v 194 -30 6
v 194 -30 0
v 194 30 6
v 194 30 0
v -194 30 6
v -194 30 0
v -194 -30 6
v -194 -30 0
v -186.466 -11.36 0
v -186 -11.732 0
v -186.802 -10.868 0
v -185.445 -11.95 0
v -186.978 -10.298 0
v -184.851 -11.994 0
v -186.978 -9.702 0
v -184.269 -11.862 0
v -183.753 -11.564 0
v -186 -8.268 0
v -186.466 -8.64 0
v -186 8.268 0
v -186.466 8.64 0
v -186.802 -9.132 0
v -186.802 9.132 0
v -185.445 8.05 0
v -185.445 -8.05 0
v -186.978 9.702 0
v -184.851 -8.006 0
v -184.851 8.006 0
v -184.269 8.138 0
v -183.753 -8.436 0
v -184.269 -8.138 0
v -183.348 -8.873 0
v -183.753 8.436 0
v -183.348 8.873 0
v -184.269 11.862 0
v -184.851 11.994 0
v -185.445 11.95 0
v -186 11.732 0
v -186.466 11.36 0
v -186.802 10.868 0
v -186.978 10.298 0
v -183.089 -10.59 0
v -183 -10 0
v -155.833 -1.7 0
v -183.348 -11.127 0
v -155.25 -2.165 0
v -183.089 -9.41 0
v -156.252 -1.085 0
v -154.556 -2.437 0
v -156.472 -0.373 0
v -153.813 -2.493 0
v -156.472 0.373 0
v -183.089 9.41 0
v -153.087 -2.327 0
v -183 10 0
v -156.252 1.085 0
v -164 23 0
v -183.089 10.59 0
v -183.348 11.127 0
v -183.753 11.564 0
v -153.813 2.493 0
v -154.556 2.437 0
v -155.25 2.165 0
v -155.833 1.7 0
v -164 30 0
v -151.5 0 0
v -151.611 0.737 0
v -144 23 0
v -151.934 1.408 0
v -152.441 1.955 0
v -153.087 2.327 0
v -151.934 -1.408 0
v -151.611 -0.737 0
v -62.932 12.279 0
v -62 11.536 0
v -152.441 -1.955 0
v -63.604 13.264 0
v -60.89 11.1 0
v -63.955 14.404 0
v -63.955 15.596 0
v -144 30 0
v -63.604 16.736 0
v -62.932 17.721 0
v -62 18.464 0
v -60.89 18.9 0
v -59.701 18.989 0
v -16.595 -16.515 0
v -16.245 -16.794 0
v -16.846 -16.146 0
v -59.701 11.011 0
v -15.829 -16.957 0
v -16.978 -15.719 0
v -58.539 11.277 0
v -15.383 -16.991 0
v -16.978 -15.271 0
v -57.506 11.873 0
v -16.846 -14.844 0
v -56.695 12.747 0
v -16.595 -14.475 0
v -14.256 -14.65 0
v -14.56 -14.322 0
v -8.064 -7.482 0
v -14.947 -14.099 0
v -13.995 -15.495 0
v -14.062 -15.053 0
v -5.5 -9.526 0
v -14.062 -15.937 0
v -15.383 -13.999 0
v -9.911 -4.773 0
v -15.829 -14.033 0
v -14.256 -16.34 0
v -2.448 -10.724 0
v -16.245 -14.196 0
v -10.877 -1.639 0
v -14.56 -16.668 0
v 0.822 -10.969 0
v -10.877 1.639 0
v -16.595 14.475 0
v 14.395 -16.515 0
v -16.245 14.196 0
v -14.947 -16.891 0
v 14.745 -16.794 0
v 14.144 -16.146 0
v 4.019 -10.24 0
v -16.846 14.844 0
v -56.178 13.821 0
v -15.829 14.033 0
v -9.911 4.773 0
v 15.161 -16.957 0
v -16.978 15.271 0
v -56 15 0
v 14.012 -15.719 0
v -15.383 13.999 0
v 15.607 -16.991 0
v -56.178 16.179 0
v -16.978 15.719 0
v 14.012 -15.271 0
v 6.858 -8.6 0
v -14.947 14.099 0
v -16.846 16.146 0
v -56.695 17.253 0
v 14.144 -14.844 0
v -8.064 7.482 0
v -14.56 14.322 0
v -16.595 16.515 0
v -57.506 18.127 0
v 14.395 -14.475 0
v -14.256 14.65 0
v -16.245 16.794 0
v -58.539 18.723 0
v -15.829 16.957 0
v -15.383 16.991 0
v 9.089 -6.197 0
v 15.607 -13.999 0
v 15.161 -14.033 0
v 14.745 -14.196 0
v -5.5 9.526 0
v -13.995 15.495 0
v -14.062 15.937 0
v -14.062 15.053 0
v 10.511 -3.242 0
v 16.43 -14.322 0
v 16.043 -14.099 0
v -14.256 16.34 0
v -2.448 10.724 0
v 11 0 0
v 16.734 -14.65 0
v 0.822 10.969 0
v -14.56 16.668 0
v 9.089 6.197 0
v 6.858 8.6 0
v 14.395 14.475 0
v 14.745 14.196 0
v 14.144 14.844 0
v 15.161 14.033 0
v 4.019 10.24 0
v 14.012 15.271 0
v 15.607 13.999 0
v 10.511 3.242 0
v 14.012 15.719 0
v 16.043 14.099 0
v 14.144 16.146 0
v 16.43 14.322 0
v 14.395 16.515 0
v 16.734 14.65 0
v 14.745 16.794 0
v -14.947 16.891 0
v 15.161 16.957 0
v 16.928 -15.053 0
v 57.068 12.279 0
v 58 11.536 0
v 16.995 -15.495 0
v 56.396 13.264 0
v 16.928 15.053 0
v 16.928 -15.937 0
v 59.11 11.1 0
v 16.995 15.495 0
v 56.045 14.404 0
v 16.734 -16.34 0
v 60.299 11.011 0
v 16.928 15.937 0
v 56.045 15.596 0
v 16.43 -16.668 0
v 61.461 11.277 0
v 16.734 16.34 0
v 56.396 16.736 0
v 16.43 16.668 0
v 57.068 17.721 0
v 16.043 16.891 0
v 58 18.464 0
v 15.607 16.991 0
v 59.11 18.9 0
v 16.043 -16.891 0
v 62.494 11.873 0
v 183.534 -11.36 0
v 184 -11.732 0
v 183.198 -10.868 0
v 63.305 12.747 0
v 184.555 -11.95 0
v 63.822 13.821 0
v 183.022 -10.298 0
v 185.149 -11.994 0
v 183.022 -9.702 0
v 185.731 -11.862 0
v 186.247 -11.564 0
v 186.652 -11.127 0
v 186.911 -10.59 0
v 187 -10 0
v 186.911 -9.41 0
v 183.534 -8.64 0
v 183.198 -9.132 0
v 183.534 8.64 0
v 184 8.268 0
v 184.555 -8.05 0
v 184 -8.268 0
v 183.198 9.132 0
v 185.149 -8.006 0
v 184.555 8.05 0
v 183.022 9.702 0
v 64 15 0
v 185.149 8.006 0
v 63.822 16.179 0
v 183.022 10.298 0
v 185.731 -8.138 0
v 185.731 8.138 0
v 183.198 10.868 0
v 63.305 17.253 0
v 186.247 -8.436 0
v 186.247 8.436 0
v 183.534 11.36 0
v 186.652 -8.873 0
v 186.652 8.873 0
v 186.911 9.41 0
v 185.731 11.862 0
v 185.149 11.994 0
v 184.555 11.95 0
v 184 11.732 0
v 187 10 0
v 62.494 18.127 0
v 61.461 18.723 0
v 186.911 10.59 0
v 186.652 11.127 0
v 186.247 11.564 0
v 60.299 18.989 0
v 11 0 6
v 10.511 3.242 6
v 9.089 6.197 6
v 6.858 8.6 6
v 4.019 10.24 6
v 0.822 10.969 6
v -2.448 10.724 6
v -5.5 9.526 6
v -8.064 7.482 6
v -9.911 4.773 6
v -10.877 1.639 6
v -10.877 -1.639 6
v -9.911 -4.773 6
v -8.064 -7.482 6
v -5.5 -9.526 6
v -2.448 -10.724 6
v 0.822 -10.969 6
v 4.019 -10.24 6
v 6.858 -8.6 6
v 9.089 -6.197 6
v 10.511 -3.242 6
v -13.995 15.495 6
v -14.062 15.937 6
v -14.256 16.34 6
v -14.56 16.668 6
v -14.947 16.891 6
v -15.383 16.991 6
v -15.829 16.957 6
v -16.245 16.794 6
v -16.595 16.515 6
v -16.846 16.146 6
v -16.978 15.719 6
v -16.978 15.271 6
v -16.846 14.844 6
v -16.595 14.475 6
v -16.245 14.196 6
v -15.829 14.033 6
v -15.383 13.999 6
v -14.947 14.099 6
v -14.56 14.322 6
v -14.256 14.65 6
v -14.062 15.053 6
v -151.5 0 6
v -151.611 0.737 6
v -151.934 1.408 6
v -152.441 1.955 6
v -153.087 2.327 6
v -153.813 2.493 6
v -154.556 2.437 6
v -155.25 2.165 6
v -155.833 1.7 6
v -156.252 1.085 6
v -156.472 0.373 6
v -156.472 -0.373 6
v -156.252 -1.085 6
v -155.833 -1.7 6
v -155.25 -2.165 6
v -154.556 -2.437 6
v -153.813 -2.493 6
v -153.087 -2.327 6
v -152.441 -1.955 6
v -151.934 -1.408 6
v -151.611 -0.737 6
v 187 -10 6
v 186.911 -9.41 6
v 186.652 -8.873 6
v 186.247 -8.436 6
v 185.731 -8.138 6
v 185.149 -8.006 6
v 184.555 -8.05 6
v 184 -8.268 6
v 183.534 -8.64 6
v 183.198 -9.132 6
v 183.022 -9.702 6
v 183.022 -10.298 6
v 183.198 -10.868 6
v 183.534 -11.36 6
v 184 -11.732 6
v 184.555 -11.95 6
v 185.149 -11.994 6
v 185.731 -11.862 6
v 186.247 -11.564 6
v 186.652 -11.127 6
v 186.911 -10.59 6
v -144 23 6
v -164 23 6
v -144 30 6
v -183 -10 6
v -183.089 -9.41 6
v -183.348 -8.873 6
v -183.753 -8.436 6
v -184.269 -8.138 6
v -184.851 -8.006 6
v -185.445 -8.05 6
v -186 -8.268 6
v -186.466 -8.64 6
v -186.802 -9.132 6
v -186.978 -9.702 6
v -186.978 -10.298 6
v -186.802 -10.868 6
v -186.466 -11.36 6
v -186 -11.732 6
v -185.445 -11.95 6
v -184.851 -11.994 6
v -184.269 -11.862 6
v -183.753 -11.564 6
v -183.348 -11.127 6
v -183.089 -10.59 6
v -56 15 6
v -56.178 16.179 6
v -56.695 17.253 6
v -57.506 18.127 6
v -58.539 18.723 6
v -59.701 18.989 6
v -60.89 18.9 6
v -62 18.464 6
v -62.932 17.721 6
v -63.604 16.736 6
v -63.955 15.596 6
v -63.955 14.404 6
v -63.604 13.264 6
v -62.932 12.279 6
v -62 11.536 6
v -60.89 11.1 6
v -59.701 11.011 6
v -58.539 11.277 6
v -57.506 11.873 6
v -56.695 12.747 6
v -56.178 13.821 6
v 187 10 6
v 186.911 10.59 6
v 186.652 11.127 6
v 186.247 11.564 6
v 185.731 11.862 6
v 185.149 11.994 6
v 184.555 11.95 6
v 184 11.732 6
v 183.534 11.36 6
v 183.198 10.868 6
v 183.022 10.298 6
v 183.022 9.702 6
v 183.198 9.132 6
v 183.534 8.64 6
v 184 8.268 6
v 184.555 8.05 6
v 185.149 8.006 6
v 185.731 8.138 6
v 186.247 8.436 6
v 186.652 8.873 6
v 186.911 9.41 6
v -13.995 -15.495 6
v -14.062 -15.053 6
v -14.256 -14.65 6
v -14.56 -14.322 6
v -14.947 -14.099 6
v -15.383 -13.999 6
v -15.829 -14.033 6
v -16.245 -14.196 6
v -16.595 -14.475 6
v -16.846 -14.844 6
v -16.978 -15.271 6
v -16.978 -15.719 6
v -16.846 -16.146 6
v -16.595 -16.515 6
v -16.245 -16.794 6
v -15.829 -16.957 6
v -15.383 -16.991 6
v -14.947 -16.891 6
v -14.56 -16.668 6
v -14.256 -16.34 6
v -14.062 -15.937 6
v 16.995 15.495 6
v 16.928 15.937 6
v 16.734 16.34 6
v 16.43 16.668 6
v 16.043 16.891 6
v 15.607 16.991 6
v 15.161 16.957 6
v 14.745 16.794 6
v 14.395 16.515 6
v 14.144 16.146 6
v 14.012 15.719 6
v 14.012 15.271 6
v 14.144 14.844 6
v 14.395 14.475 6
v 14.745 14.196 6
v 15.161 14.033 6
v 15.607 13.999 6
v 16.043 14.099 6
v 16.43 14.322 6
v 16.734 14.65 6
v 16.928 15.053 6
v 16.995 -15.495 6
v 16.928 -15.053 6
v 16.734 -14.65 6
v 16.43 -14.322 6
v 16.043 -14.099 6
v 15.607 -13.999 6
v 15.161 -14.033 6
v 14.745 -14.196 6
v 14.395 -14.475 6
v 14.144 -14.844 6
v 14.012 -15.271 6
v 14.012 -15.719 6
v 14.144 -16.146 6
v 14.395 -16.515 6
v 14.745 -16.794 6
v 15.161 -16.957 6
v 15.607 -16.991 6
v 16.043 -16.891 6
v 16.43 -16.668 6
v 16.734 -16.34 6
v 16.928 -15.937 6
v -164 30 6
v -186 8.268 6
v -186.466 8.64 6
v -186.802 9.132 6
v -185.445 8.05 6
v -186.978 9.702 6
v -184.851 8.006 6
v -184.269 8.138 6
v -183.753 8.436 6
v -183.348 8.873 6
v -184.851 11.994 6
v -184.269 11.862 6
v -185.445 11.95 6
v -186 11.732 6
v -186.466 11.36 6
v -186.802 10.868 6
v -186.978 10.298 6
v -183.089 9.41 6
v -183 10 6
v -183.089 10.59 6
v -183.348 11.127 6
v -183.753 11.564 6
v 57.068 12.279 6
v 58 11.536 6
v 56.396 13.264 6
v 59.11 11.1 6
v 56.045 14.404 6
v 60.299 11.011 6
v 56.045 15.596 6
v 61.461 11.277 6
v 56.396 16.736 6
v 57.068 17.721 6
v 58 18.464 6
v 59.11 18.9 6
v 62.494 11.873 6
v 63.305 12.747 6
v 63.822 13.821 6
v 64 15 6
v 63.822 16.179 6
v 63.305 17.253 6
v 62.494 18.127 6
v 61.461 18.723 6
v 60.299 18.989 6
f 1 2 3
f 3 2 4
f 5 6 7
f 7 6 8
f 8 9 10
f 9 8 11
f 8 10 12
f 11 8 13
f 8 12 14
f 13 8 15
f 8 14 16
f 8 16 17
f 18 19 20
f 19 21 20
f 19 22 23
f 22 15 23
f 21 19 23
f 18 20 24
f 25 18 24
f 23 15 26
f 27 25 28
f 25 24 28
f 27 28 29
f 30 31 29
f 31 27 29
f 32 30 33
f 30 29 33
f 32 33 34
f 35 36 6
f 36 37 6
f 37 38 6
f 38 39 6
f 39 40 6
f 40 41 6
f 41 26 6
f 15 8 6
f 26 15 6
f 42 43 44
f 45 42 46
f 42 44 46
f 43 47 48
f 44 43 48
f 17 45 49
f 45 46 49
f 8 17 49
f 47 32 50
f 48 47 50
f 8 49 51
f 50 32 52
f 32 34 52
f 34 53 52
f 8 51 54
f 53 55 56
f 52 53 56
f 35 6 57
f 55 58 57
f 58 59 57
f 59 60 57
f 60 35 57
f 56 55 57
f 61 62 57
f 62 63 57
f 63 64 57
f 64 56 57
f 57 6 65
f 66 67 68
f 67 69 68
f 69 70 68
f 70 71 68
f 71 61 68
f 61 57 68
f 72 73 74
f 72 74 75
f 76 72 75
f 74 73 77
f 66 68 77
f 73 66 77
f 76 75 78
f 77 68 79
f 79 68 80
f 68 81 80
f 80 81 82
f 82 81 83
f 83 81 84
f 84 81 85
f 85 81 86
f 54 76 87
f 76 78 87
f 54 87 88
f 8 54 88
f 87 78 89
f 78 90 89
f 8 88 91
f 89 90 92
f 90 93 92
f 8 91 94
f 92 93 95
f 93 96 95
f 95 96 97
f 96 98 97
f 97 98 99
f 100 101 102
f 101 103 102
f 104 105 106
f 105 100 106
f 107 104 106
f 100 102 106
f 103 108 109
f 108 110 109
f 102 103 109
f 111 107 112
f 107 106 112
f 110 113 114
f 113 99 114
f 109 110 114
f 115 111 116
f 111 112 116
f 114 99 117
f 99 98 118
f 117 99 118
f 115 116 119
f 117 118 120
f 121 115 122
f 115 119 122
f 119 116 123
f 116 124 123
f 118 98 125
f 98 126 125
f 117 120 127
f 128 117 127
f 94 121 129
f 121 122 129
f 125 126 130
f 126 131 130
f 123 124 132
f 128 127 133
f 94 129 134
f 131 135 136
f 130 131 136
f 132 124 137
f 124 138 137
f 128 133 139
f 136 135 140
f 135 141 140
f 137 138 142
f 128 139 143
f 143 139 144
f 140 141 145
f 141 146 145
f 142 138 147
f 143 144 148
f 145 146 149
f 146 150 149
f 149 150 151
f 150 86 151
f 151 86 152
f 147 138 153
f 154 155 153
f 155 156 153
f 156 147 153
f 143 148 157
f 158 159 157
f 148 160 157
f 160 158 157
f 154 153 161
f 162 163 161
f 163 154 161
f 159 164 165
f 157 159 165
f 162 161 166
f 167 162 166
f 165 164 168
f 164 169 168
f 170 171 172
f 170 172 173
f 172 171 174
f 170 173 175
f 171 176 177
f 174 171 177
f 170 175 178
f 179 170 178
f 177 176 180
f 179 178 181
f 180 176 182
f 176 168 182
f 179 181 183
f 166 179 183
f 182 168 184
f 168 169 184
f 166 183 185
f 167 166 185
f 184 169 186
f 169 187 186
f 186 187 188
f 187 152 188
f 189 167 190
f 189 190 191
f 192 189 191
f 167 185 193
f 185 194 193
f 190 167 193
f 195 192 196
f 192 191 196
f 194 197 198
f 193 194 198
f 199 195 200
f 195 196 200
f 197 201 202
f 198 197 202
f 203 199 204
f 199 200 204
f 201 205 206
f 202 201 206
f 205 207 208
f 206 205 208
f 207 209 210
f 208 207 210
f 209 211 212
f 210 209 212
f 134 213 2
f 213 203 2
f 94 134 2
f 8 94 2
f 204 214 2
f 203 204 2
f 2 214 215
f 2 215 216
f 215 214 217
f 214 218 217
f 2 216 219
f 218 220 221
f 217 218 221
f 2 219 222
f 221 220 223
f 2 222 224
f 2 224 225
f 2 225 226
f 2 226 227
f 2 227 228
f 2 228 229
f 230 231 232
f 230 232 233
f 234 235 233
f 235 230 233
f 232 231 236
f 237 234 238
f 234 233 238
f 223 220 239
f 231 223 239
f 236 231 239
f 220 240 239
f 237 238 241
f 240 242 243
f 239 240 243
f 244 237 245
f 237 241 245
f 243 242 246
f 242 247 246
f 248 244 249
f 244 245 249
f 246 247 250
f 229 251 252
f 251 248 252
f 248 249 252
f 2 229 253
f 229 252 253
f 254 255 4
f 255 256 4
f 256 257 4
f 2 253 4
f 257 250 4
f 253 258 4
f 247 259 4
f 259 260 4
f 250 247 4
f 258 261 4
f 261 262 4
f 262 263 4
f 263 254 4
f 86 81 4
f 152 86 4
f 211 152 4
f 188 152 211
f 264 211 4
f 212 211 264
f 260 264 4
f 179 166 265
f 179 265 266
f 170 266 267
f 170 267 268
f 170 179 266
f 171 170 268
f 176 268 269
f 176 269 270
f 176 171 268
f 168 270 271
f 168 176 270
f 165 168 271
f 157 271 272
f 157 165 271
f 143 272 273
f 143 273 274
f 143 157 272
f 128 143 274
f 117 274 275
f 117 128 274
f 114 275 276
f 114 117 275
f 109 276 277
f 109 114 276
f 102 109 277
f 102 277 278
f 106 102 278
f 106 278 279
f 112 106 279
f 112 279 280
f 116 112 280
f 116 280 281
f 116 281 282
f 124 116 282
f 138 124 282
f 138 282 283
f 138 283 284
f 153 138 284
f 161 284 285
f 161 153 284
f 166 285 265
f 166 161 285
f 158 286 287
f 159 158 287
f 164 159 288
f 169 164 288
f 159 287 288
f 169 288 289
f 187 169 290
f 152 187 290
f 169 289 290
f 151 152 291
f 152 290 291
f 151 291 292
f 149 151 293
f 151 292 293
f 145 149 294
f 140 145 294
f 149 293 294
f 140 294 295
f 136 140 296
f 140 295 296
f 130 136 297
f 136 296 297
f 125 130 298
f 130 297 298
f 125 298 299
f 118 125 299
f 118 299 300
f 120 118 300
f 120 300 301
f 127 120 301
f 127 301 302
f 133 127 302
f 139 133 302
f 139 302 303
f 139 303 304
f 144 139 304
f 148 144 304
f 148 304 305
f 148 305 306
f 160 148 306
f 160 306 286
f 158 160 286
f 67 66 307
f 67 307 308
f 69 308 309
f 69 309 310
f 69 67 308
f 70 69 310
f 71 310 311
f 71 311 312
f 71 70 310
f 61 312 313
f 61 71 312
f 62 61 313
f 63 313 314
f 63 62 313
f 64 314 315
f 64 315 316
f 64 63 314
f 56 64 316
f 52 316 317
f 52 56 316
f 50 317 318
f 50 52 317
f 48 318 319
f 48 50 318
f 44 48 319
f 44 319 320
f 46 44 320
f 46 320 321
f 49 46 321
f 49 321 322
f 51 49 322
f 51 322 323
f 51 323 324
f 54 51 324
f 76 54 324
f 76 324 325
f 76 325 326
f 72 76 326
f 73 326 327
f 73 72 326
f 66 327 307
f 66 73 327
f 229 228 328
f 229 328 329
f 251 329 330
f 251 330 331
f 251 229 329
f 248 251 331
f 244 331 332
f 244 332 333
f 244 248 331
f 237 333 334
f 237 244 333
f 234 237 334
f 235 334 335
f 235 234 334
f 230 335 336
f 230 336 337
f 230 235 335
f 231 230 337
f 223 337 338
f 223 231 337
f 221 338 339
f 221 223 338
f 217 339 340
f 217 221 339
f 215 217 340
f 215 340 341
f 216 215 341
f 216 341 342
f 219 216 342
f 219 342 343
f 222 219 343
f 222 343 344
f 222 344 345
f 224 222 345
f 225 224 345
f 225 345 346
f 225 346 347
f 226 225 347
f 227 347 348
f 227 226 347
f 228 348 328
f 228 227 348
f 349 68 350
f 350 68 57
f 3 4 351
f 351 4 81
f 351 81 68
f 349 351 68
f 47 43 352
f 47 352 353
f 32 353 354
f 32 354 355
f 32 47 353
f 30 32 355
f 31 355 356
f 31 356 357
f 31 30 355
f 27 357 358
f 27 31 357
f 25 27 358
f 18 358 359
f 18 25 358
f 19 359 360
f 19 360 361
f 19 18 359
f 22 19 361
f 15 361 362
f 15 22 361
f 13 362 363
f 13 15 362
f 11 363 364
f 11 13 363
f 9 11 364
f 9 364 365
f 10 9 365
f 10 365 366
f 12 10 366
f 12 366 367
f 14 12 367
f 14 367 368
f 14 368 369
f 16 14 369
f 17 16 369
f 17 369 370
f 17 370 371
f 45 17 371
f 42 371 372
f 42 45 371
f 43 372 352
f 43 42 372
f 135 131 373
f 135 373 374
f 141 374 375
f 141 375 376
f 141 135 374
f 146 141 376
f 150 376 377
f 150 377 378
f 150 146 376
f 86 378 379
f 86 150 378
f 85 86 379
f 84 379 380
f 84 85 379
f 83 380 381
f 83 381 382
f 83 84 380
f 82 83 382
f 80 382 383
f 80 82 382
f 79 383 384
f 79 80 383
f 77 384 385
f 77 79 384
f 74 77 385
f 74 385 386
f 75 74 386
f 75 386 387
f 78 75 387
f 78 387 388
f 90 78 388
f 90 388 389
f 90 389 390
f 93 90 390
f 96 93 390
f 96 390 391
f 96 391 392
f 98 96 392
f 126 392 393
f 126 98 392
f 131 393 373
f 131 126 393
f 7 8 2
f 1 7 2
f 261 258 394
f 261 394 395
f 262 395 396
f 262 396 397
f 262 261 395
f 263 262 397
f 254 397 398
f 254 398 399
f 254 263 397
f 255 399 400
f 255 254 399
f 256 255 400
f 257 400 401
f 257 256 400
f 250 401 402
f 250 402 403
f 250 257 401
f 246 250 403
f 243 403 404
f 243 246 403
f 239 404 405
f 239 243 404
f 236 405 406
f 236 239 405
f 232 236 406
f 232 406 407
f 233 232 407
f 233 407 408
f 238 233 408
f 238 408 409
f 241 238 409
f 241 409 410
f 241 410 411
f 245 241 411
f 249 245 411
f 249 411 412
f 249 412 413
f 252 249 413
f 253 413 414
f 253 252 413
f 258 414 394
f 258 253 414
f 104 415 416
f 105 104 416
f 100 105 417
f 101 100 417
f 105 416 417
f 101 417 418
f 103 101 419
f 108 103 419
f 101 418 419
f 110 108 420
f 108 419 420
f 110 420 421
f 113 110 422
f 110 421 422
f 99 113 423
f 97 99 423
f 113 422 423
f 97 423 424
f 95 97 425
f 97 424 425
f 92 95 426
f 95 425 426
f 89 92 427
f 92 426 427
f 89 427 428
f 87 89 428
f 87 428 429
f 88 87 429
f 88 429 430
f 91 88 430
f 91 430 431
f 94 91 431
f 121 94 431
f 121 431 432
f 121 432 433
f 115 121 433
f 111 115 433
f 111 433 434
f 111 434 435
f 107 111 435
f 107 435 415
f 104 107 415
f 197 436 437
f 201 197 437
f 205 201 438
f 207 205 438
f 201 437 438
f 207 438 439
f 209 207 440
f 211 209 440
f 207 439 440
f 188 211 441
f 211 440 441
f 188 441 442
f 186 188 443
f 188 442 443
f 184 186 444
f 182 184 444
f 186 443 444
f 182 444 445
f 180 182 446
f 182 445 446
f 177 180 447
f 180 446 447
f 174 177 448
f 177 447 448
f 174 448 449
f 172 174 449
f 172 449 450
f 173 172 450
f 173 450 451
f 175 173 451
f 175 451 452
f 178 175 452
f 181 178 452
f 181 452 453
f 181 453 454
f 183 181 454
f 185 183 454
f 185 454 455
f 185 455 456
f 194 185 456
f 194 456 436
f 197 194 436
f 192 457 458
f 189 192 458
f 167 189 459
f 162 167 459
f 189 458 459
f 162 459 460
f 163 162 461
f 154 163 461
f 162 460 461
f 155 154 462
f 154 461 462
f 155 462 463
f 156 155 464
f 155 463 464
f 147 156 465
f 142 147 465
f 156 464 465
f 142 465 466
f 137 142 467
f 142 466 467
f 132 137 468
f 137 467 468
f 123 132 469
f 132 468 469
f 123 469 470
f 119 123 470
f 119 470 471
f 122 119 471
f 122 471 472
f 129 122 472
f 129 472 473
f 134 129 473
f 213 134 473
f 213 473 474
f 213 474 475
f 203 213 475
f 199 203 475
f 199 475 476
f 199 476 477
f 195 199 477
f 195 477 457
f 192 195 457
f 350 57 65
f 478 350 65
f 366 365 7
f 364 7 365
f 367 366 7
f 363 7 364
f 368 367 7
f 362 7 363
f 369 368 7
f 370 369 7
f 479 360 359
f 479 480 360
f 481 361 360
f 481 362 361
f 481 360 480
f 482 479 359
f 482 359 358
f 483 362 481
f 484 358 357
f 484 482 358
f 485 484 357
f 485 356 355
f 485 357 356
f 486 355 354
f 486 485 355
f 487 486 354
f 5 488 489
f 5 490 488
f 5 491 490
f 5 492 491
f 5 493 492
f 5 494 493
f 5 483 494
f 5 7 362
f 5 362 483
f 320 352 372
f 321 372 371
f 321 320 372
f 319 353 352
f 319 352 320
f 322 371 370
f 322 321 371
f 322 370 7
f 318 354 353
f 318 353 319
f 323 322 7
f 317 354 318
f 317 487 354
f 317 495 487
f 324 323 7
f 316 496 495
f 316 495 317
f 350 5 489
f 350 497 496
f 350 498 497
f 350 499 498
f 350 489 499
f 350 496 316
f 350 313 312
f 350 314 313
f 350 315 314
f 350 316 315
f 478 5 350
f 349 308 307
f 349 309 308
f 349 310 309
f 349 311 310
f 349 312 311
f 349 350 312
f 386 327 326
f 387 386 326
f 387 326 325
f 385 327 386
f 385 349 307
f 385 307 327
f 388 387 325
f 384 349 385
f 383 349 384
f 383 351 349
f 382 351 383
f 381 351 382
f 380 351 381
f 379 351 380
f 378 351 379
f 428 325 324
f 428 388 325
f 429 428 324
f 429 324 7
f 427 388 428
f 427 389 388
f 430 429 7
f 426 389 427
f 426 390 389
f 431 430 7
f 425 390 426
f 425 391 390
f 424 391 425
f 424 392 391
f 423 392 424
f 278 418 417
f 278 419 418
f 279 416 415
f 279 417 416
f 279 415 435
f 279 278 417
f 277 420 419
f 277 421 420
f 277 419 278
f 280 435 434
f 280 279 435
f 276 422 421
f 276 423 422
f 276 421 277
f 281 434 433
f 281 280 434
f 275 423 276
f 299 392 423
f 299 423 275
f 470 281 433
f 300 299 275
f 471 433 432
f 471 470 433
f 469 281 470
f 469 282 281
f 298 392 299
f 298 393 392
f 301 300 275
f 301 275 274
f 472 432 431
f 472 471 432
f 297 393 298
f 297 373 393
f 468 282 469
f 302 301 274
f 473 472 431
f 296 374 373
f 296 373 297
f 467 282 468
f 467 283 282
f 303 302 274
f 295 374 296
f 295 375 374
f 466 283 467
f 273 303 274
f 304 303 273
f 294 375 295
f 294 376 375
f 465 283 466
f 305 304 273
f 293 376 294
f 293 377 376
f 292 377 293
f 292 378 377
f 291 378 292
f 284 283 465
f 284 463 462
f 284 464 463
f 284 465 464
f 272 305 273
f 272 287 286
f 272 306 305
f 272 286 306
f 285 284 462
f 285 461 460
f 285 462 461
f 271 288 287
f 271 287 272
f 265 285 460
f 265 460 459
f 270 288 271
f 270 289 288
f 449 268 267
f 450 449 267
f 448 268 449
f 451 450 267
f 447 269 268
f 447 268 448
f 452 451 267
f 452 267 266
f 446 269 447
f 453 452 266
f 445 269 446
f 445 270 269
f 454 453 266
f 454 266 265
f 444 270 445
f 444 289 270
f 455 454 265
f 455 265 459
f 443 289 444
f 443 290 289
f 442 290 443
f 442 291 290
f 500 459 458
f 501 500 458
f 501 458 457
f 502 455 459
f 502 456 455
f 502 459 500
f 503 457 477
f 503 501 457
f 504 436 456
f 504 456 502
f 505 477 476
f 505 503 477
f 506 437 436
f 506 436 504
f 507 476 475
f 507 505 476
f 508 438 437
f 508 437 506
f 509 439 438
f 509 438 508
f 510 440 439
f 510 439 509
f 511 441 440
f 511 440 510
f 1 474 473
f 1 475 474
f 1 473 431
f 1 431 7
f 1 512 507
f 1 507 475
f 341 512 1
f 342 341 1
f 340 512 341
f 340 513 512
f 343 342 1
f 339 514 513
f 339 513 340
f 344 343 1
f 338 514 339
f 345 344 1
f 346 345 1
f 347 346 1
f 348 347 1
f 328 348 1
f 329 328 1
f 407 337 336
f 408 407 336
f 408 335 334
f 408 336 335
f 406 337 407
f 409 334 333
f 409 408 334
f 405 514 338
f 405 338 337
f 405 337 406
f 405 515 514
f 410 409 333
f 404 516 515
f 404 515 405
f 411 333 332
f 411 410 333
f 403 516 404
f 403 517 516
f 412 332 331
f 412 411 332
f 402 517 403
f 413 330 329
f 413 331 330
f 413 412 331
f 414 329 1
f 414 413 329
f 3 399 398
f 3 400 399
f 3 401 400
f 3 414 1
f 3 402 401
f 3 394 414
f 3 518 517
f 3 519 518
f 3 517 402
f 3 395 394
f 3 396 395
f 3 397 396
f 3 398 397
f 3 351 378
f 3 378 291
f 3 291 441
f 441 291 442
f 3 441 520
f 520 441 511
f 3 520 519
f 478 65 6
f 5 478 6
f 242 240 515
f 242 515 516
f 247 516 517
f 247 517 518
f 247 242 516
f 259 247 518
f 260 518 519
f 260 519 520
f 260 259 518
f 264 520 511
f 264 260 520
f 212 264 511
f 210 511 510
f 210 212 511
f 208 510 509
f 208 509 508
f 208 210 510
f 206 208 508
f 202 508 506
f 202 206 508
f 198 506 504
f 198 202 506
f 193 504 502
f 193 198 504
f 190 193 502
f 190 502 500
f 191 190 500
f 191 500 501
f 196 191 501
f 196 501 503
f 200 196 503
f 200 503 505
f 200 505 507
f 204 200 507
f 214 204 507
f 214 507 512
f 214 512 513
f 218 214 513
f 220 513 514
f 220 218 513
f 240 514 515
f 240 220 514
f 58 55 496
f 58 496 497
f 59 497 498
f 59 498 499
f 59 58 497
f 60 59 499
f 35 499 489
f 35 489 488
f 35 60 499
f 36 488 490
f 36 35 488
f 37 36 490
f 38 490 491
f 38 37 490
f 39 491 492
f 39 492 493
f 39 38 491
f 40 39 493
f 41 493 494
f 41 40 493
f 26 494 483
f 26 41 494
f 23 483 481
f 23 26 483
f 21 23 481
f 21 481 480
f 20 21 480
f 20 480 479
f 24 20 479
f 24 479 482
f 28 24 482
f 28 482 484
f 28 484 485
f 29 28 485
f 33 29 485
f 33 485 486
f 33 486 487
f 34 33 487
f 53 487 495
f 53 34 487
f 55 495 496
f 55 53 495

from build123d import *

# Parameters (mm, degrees)
SKETCH1_R           = 2
SKETCH1_R_2         = 2.5
SKETCH1_R_3         = 4
SKETCH1_R_4         = 11
BOSS_EXTRUDE1_DEPTH = 6
CUT_EXTRUDE1_REACH  = 8
SKETCH2_R           = 1.5


with BuildPart() as part:
    # Sketch1 → Boss-Extrude1 (new body)
    with BuildSketch(Plane.XY):
        Polygon((-194, 30), (-194, -30), (194, -30), (194, 30), (-144, 30), (-144, 23), (-164, 23), (-164, 30), align=None)
        with Locations((-185, -10)):
            Circle(SKETCH1_R, mode=Mode.SUBTRACT)
        with Locations((185, -10)):
            Circle(SKETCH1_R, mode=Mode.SUBTRACT)
        with Locations((-154, 0)):
            Circle(SKETCH1_R_2, mode=Mode.SUBTRACT)
        with Locations((-185, 10)):
            Circle(SKETCH1_R, mode=Mode.SUBTRACT)
        with Locations((-60, 15)):
            Circle(SKETCH1_R_3, mode=Mode.SUBTRACT)
        Circle(SKETCH1_R_4, mode=Mode.SUBTRACT)
        with Locations((60, 15)):
            Circle(SKETCH1_R_3, mode=Mode.SUBTRACT)
        with Locations((185, 10)):
            Circle(SKETCH1_R, mode=Mode.SUBTRACT)
    extrude(amount=BOSS_EXTRUDE1_DEPTH)

    # Sketch2 → Cut-Extrude1 (cut, up to next)
    with BuildSketch(Plane.XY.offset(6), mode=Mode.PRIVATE) as cut_extrude1_sk1:
        with Locations((15.495, 15.495)):
            Circle(SKETCH2_R)
    cut_extrude1_tool1 = extrude(cut_extrude1_sk1.sketch, amount=-CUT_EXTRUDE1_REACH, mode=Mode.PRIVATE) & part.part
    add(cut_extrude1_tool1.solids().sort_by_distance((15.495, 15.495, 6))[0], mode=Mode.SUBTRACT)
    # Sketch2 → Cut-Extrude1 (cut, up to next)
    with BuildSketch(Plane.XY.offset(6), mode=Mode.PRIVATE) as cut_extrude1_sk2:
        with Locations((-15.495, 15.495)):
            Circle(SKETCH2_R)
    cut_extrude1_tool2 = extrude(cut_extrude1_sk2.sketch, amount=-CUT_EXTRUDE1_REACH, mode=Mode.PRIVATE) & part.part
    add(cut_extrude1_tool2.solids().sort_by_distance((-15.495, 15.495, 6))[0], mode=Mode.SUBTRACT)
    # Sketch2 → Cut-Extrude1 (cut, up to next)
    with BuildSketch(Plane.XY.offset(6), mode=Mode.PRIVATE) as cut_extrude1_sk3:
        with Locations((15.495, -15.495)):
            Circle(SKETCH2_R)
    cut_extrude1_tool3 = extrude(cut_extrude1_sk3.sketch, amount=-CUT_EXTRUDE1_REACH, mode=Mode.PRIVATE) & part.part
    add(cut_extrude1_tool3.solids().sort_by_distance((15.495, -15.495, 6))[0], mode=Mode.SUBTRACT)
    # Sketch2 → Cut-Extrude1 (cut, up to next)
    with BuildSketch(Plane.XY.offset(6), mode=Mode.PRIVATE) as cut_extrude1_sk4:
        with Locations((-15.495, -15.495)):
            Circle(SKETCH2_R)
    cut_extrude1_tool4 = extrude(cut_extrude1_sk4.sketch, amount=-CUT_EXTRUDE1_REACH, mode=Mode.PRIVATE) & part.part
    add(cut_extrude1_tool4.solids().sort_by_distance((-15.495, -15.495, 6))[0], mode=Mode.SUBTRACT)


solid = part.part
